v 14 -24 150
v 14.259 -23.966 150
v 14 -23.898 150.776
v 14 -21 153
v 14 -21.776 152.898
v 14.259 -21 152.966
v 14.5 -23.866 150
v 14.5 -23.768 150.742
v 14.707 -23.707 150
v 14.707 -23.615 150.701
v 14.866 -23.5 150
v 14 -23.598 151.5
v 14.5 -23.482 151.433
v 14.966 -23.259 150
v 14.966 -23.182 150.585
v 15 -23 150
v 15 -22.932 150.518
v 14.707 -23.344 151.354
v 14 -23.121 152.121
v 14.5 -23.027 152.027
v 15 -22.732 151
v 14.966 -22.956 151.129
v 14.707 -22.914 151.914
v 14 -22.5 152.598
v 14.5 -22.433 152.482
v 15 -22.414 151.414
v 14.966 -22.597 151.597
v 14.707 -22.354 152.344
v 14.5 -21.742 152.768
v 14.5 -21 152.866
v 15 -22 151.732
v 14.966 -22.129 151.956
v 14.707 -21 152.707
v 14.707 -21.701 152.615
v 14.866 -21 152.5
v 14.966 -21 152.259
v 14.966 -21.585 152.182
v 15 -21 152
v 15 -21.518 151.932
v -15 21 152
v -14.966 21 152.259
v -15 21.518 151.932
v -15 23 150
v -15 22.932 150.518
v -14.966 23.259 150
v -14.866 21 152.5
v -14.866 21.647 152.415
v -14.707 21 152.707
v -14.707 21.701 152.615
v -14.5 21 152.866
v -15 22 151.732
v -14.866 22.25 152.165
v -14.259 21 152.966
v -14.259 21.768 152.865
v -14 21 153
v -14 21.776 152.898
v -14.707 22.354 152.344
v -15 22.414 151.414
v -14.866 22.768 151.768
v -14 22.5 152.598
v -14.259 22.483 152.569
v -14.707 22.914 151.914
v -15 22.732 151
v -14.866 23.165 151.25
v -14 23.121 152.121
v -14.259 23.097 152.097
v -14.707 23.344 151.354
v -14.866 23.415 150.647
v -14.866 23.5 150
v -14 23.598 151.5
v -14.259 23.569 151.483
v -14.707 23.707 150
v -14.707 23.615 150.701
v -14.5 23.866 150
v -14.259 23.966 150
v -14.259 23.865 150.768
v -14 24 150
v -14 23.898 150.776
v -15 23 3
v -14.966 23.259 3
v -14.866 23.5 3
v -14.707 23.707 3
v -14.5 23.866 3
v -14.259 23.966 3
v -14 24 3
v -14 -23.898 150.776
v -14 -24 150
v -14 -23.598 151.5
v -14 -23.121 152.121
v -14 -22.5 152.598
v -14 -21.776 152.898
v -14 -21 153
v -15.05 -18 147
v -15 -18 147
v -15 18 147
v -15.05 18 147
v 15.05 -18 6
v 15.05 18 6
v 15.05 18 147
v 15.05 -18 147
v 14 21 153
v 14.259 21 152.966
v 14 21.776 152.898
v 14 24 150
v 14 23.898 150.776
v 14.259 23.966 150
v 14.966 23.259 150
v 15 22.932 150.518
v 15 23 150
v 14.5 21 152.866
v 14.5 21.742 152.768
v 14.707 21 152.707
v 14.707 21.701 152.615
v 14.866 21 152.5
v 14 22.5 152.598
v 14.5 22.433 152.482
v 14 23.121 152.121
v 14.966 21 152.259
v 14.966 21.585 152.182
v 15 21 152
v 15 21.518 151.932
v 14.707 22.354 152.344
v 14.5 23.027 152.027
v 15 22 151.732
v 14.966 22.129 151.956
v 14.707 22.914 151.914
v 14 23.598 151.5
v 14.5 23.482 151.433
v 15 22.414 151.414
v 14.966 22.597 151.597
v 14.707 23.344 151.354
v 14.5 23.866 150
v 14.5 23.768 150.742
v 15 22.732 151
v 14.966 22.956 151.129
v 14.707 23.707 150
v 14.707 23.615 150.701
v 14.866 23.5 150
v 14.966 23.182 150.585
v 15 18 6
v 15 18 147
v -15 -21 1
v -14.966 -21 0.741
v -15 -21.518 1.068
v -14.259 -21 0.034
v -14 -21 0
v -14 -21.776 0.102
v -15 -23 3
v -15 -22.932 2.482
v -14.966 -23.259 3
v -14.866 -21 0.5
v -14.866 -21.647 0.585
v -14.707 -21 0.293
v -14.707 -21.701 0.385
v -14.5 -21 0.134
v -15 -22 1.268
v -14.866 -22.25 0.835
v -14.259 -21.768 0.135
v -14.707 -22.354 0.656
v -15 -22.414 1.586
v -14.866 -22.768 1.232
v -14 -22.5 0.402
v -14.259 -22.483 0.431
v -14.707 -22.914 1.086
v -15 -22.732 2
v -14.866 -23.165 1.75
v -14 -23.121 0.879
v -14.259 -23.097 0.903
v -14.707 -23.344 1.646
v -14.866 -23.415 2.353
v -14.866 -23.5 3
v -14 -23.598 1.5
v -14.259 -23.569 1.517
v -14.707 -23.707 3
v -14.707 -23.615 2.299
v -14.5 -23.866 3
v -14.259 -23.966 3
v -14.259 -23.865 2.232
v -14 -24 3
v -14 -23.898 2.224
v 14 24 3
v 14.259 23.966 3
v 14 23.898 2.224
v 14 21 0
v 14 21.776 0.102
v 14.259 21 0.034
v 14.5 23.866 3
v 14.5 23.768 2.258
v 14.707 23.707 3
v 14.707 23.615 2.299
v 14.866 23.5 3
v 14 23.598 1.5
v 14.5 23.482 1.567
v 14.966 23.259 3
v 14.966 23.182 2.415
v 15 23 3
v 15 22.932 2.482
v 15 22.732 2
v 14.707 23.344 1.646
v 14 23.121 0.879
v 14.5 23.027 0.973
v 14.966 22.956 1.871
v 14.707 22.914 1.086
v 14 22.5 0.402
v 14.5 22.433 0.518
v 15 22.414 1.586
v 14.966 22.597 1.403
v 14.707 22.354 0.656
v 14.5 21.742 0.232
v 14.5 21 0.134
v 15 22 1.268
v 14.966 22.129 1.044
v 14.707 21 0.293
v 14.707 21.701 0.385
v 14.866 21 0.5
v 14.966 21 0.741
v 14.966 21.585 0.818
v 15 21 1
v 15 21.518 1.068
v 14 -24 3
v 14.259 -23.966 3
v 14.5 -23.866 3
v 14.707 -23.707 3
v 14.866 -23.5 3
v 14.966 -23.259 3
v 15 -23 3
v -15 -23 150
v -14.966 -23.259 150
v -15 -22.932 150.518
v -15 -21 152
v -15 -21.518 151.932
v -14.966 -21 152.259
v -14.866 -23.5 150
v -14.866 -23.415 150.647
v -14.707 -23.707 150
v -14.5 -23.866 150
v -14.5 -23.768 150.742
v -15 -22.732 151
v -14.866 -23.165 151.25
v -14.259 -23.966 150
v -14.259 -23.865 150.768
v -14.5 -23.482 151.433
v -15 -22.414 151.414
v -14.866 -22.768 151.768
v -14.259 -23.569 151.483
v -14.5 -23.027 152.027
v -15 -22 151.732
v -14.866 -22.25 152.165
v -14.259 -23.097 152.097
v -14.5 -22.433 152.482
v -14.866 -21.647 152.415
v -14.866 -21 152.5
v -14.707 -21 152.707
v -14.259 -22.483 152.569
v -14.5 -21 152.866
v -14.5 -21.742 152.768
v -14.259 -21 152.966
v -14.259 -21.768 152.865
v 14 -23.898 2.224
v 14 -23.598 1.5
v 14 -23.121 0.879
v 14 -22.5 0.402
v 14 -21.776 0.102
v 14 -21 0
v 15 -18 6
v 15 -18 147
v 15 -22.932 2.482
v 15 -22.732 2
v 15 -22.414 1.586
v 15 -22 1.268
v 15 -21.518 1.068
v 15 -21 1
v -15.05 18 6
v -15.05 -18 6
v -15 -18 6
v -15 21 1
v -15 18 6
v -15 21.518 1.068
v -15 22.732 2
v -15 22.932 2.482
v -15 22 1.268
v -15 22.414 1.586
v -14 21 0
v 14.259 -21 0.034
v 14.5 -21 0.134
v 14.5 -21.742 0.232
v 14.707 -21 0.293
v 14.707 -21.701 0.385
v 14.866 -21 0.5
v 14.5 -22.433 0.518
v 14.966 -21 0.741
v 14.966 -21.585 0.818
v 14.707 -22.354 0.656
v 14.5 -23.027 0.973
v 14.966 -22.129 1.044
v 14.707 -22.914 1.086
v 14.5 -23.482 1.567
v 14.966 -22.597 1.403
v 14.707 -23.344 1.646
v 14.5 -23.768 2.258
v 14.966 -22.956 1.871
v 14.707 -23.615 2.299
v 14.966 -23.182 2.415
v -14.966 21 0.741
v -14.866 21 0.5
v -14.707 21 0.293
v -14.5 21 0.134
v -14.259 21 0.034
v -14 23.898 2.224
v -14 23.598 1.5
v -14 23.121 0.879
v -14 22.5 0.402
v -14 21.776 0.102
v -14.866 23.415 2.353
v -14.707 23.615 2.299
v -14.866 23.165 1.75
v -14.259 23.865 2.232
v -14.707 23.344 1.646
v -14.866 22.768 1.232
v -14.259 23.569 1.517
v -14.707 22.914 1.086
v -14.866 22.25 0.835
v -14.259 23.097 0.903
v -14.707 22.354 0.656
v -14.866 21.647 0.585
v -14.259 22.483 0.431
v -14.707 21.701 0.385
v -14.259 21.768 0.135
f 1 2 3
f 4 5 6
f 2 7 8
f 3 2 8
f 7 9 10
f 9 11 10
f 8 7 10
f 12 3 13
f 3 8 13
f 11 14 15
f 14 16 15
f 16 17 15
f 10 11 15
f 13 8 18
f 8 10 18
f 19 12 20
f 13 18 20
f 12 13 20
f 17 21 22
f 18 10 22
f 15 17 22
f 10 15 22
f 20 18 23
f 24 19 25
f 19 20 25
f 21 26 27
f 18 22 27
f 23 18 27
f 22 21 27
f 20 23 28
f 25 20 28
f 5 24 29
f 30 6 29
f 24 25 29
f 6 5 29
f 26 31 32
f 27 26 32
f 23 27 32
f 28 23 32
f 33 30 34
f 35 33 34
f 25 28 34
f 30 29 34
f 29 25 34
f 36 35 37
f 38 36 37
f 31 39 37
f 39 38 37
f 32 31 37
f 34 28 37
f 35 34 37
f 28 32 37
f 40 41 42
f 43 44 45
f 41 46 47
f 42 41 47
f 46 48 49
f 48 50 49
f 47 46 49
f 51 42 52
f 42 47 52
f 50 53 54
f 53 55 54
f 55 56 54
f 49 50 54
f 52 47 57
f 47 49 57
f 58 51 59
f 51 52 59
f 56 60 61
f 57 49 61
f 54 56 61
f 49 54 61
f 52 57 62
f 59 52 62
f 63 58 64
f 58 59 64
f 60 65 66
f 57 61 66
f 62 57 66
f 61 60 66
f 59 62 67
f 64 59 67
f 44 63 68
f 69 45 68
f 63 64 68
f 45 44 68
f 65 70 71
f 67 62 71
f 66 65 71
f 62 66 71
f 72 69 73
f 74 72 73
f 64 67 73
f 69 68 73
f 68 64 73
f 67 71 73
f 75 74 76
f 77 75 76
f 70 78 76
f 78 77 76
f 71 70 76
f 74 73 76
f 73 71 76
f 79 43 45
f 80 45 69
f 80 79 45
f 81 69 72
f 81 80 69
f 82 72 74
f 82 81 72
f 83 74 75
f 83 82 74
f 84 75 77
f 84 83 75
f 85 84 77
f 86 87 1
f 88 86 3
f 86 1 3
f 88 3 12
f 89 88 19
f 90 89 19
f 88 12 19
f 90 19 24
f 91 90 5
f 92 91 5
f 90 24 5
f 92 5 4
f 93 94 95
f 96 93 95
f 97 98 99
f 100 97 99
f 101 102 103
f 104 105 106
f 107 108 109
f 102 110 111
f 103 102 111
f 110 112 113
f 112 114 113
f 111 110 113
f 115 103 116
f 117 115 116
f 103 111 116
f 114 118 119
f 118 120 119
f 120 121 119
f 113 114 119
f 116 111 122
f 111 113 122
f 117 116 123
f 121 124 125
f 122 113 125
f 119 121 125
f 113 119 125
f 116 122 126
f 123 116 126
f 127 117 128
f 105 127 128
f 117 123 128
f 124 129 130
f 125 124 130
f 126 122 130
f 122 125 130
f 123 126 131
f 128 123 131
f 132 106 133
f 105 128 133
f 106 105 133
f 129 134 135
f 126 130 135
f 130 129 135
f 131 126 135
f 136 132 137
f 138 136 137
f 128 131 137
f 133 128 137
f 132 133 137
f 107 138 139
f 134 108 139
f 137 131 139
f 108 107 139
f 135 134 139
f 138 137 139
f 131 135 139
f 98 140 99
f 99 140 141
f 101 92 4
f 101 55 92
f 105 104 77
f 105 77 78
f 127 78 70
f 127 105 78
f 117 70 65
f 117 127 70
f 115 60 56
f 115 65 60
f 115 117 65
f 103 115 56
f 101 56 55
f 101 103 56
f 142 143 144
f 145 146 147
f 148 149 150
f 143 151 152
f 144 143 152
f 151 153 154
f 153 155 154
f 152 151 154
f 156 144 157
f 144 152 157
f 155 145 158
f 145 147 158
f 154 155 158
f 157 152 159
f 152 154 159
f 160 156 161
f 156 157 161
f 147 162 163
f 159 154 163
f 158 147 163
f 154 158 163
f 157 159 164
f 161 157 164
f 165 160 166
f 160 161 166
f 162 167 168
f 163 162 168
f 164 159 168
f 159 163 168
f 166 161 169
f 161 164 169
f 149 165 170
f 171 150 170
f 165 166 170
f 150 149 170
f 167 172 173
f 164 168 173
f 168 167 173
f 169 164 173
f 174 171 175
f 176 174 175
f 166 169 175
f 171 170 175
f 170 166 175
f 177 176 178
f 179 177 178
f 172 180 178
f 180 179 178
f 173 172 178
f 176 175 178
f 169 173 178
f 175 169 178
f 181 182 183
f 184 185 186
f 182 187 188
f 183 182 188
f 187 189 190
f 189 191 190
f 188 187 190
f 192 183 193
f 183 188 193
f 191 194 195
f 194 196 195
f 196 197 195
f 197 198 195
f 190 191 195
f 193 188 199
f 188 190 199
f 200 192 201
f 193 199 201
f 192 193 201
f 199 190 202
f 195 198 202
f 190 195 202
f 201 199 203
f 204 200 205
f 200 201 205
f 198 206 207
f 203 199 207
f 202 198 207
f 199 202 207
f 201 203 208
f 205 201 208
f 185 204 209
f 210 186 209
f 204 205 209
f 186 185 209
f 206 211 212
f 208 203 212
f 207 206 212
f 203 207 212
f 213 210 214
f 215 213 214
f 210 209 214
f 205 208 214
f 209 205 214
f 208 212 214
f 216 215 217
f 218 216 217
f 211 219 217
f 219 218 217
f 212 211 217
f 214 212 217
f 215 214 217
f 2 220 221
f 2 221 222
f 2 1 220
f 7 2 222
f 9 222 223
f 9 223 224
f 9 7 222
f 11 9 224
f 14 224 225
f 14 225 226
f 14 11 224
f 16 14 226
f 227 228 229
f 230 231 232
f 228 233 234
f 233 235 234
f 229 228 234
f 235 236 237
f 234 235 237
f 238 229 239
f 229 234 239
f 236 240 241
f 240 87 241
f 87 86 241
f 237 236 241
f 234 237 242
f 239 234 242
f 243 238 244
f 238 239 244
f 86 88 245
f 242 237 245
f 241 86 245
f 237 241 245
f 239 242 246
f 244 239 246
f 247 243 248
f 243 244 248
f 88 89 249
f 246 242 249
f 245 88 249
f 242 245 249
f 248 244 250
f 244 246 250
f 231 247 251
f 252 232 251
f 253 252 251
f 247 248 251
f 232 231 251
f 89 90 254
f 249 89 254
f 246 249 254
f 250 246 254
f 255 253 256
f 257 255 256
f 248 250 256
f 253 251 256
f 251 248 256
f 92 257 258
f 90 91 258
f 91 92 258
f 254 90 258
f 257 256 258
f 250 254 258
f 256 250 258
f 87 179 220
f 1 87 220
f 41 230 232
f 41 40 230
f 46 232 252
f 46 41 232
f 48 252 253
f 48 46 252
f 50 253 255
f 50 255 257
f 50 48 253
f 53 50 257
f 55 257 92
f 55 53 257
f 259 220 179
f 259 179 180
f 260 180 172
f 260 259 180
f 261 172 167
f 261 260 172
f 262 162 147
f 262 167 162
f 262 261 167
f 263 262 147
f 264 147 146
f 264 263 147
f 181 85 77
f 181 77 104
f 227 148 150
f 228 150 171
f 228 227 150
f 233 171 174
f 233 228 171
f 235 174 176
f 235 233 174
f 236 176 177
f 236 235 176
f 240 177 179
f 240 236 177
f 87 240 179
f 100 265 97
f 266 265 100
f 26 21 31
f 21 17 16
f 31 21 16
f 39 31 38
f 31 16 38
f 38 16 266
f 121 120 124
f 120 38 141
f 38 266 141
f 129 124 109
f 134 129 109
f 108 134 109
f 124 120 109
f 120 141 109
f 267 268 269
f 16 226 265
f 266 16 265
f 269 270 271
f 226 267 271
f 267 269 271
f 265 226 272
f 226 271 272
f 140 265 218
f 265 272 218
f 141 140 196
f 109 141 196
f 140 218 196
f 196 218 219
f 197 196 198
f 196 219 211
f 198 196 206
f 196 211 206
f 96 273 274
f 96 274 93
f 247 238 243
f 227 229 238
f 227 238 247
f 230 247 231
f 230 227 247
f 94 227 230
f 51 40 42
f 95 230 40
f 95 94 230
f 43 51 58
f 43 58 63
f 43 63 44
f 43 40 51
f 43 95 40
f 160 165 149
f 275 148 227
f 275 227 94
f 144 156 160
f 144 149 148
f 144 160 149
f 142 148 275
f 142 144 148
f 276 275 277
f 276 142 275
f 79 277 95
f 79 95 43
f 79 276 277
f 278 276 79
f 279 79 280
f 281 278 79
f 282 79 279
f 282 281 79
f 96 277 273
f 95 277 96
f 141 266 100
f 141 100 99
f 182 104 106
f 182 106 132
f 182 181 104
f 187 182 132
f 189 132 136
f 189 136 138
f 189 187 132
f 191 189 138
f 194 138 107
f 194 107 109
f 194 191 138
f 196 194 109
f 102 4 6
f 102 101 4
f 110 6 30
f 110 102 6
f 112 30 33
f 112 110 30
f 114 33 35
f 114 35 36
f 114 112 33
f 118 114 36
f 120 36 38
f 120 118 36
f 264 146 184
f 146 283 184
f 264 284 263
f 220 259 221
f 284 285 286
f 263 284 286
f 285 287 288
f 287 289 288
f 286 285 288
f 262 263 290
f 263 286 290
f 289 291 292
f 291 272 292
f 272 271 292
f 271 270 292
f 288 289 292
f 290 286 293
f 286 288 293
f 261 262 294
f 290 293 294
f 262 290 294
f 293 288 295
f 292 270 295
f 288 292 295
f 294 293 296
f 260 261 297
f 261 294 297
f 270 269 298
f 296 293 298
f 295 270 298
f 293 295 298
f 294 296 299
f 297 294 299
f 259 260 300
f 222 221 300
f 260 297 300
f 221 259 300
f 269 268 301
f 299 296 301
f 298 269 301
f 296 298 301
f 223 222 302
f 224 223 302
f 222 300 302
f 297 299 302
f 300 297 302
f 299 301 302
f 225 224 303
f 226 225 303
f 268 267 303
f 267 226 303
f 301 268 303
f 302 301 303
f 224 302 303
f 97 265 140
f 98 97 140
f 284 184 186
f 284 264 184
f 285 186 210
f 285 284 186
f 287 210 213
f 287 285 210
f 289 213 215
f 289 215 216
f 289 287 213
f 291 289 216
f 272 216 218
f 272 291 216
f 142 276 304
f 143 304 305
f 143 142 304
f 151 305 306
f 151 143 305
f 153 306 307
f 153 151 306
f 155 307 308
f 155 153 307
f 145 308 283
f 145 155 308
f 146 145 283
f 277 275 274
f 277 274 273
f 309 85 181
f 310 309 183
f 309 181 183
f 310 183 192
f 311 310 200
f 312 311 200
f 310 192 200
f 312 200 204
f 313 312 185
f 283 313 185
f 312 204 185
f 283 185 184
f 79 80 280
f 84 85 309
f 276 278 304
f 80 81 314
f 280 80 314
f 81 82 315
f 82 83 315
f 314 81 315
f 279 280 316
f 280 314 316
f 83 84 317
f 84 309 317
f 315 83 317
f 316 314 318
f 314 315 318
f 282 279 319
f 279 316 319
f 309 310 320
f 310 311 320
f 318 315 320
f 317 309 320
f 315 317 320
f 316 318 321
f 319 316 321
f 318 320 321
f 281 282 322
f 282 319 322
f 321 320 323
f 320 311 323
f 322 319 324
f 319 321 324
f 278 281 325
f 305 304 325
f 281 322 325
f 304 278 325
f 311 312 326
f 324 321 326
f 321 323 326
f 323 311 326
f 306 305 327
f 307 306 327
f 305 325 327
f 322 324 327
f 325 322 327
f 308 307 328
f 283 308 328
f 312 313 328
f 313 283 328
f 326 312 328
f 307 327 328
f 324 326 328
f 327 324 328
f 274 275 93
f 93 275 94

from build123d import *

# Parameters (mm, degrees)
SKETCH1_W           = 30
SKETCH1_H           = 48
BOSS_EXTRUDE1_DEPTH = 153
FILLET1_R           = 3
FILLET2_R           = 1
SKETCH2_W           = 141
SKETCH2_H           = 36
BOSS_EXTRUDE2_DEPTH = 0.05


with BuildPart() as part:
    # Sketch1 → Boss-Extrude1 (new body)
    with BuildSketch(Plane.XY):
        Rectangle(SKETCH1_W, SKETCH1_H)
    extrude(amount=BOSS_EXTRUDE1_DEPTH)

    # Fillet1
    fillet1_edges = [part.edges().sort_by_distance(p)[0] for p in [
        (0, -24, 153),
        (0, -24, 0),
        (0, 24, 0),
        (0, 24, 153),
    ]]
    fillet(fillet1_edges, radius=FILLET1_R)

    # Fillet2
    fillet2_edges = [part.edges().sort_by_distance(p)[0] for p in [
        (15, 0, 153),
        (-15, 0, 153),
        (15, 0, 0),
        (15, 24, 76.5),
        (15, -24, 76.5),
        (15, 23.121320344, 152.121320344),
        (15, 23.121320344, 0.878679656),
        (15, -23.121320344, 0.878679656),
        (15, -23.121320344, 152.121320344),
        (-15, -24, 76.5),
        (-15, 0, 0),
        (-15, 24, 76.5),
        (-15, 23.121320344, 152.121320344),
        (-15, 23.121320344, 0.878679656),
        (-15, -23.121320344, 0.878679656),
        (-15, -23.121320344, 152.121320344),
    ]]
    fillet(fillet2_edges, radius=FILLET2_R)

    # Sketch2 → Boss-Extrude2 (add)
    with BuildSketch(Plane.ZY.offset(15)):
        with Locations((76.5, 0)):
            Rectangle(SKETCH2_W, SKETCH2_H)
    boss_extrude2 = extrude(amount=BOSS_EXTRUDE2_DEPTH)

    # Mirror1: Boss-Extrude2 across plane
    add(boss_extrude2.mirror(Plane(origin=(0, 0, 0), x_dir=(0, 0, 1), z_dir=(1, 0, 0))))


solid = part.part
